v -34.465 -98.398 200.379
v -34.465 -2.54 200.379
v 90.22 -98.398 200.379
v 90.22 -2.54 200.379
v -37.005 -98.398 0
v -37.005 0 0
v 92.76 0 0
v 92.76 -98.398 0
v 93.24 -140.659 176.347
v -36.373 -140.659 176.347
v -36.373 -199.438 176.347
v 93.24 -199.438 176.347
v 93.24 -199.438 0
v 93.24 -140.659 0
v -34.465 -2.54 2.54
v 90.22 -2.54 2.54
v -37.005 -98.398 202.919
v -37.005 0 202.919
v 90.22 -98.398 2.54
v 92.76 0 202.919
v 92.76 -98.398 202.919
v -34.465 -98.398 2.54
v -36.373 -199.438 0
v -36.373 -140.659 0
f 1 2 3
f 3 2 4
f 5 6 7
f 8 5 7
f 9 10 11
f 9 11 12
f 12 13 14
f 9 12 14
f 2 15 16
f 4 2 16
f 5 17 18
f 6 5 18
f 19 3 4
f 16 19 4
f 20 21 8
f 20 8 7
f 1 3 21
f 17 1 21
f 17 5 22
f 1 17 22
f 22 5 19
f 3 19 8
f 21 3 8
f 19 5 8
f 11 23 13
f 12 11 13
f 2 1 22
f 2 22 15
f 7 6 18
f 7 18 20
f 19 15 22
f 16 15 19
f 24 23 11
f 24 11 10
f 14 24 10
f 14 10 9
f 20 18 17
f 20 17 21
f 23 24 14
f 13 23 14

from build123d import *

# Parameters (mm, degrees)
F0_W     = 129.765436
F0_H     = 98.398015
F1_DEPTH = 202.918738
F2_T     = -2.54
F3_W     = 129.613683
F3_H     = 58.778941
F4_DEPTH = 176.346825


with BuildPart() as f1:
    # F0 (on face) → F1 (new body)
    with BuildSketch(Plane.XY):
        with Locations((27.877308, -49.199008)):
            Rectangle(F0_W, F0_H)
    extrude(amount=F1_DEPTH)

    # F2
    f2_openings = [f1.faces().sort_by_distance(p)[0] for p in [
        (27.877308, -98.398015, 101.459369),
    ]]
    offset(amount=F2_T, openings=f2_openings)


with BuildPart() as f4:
    # F3 (on Top) → F4 (new body)
    with BuildSketch(Plane.XY):
        with Locations((28.433643, -170.048744)):
            Rectangle(F3_W, F3_H)
    extrude(amount=F4_DEPTH)


solid = Compound([f1.part, f4.part])
